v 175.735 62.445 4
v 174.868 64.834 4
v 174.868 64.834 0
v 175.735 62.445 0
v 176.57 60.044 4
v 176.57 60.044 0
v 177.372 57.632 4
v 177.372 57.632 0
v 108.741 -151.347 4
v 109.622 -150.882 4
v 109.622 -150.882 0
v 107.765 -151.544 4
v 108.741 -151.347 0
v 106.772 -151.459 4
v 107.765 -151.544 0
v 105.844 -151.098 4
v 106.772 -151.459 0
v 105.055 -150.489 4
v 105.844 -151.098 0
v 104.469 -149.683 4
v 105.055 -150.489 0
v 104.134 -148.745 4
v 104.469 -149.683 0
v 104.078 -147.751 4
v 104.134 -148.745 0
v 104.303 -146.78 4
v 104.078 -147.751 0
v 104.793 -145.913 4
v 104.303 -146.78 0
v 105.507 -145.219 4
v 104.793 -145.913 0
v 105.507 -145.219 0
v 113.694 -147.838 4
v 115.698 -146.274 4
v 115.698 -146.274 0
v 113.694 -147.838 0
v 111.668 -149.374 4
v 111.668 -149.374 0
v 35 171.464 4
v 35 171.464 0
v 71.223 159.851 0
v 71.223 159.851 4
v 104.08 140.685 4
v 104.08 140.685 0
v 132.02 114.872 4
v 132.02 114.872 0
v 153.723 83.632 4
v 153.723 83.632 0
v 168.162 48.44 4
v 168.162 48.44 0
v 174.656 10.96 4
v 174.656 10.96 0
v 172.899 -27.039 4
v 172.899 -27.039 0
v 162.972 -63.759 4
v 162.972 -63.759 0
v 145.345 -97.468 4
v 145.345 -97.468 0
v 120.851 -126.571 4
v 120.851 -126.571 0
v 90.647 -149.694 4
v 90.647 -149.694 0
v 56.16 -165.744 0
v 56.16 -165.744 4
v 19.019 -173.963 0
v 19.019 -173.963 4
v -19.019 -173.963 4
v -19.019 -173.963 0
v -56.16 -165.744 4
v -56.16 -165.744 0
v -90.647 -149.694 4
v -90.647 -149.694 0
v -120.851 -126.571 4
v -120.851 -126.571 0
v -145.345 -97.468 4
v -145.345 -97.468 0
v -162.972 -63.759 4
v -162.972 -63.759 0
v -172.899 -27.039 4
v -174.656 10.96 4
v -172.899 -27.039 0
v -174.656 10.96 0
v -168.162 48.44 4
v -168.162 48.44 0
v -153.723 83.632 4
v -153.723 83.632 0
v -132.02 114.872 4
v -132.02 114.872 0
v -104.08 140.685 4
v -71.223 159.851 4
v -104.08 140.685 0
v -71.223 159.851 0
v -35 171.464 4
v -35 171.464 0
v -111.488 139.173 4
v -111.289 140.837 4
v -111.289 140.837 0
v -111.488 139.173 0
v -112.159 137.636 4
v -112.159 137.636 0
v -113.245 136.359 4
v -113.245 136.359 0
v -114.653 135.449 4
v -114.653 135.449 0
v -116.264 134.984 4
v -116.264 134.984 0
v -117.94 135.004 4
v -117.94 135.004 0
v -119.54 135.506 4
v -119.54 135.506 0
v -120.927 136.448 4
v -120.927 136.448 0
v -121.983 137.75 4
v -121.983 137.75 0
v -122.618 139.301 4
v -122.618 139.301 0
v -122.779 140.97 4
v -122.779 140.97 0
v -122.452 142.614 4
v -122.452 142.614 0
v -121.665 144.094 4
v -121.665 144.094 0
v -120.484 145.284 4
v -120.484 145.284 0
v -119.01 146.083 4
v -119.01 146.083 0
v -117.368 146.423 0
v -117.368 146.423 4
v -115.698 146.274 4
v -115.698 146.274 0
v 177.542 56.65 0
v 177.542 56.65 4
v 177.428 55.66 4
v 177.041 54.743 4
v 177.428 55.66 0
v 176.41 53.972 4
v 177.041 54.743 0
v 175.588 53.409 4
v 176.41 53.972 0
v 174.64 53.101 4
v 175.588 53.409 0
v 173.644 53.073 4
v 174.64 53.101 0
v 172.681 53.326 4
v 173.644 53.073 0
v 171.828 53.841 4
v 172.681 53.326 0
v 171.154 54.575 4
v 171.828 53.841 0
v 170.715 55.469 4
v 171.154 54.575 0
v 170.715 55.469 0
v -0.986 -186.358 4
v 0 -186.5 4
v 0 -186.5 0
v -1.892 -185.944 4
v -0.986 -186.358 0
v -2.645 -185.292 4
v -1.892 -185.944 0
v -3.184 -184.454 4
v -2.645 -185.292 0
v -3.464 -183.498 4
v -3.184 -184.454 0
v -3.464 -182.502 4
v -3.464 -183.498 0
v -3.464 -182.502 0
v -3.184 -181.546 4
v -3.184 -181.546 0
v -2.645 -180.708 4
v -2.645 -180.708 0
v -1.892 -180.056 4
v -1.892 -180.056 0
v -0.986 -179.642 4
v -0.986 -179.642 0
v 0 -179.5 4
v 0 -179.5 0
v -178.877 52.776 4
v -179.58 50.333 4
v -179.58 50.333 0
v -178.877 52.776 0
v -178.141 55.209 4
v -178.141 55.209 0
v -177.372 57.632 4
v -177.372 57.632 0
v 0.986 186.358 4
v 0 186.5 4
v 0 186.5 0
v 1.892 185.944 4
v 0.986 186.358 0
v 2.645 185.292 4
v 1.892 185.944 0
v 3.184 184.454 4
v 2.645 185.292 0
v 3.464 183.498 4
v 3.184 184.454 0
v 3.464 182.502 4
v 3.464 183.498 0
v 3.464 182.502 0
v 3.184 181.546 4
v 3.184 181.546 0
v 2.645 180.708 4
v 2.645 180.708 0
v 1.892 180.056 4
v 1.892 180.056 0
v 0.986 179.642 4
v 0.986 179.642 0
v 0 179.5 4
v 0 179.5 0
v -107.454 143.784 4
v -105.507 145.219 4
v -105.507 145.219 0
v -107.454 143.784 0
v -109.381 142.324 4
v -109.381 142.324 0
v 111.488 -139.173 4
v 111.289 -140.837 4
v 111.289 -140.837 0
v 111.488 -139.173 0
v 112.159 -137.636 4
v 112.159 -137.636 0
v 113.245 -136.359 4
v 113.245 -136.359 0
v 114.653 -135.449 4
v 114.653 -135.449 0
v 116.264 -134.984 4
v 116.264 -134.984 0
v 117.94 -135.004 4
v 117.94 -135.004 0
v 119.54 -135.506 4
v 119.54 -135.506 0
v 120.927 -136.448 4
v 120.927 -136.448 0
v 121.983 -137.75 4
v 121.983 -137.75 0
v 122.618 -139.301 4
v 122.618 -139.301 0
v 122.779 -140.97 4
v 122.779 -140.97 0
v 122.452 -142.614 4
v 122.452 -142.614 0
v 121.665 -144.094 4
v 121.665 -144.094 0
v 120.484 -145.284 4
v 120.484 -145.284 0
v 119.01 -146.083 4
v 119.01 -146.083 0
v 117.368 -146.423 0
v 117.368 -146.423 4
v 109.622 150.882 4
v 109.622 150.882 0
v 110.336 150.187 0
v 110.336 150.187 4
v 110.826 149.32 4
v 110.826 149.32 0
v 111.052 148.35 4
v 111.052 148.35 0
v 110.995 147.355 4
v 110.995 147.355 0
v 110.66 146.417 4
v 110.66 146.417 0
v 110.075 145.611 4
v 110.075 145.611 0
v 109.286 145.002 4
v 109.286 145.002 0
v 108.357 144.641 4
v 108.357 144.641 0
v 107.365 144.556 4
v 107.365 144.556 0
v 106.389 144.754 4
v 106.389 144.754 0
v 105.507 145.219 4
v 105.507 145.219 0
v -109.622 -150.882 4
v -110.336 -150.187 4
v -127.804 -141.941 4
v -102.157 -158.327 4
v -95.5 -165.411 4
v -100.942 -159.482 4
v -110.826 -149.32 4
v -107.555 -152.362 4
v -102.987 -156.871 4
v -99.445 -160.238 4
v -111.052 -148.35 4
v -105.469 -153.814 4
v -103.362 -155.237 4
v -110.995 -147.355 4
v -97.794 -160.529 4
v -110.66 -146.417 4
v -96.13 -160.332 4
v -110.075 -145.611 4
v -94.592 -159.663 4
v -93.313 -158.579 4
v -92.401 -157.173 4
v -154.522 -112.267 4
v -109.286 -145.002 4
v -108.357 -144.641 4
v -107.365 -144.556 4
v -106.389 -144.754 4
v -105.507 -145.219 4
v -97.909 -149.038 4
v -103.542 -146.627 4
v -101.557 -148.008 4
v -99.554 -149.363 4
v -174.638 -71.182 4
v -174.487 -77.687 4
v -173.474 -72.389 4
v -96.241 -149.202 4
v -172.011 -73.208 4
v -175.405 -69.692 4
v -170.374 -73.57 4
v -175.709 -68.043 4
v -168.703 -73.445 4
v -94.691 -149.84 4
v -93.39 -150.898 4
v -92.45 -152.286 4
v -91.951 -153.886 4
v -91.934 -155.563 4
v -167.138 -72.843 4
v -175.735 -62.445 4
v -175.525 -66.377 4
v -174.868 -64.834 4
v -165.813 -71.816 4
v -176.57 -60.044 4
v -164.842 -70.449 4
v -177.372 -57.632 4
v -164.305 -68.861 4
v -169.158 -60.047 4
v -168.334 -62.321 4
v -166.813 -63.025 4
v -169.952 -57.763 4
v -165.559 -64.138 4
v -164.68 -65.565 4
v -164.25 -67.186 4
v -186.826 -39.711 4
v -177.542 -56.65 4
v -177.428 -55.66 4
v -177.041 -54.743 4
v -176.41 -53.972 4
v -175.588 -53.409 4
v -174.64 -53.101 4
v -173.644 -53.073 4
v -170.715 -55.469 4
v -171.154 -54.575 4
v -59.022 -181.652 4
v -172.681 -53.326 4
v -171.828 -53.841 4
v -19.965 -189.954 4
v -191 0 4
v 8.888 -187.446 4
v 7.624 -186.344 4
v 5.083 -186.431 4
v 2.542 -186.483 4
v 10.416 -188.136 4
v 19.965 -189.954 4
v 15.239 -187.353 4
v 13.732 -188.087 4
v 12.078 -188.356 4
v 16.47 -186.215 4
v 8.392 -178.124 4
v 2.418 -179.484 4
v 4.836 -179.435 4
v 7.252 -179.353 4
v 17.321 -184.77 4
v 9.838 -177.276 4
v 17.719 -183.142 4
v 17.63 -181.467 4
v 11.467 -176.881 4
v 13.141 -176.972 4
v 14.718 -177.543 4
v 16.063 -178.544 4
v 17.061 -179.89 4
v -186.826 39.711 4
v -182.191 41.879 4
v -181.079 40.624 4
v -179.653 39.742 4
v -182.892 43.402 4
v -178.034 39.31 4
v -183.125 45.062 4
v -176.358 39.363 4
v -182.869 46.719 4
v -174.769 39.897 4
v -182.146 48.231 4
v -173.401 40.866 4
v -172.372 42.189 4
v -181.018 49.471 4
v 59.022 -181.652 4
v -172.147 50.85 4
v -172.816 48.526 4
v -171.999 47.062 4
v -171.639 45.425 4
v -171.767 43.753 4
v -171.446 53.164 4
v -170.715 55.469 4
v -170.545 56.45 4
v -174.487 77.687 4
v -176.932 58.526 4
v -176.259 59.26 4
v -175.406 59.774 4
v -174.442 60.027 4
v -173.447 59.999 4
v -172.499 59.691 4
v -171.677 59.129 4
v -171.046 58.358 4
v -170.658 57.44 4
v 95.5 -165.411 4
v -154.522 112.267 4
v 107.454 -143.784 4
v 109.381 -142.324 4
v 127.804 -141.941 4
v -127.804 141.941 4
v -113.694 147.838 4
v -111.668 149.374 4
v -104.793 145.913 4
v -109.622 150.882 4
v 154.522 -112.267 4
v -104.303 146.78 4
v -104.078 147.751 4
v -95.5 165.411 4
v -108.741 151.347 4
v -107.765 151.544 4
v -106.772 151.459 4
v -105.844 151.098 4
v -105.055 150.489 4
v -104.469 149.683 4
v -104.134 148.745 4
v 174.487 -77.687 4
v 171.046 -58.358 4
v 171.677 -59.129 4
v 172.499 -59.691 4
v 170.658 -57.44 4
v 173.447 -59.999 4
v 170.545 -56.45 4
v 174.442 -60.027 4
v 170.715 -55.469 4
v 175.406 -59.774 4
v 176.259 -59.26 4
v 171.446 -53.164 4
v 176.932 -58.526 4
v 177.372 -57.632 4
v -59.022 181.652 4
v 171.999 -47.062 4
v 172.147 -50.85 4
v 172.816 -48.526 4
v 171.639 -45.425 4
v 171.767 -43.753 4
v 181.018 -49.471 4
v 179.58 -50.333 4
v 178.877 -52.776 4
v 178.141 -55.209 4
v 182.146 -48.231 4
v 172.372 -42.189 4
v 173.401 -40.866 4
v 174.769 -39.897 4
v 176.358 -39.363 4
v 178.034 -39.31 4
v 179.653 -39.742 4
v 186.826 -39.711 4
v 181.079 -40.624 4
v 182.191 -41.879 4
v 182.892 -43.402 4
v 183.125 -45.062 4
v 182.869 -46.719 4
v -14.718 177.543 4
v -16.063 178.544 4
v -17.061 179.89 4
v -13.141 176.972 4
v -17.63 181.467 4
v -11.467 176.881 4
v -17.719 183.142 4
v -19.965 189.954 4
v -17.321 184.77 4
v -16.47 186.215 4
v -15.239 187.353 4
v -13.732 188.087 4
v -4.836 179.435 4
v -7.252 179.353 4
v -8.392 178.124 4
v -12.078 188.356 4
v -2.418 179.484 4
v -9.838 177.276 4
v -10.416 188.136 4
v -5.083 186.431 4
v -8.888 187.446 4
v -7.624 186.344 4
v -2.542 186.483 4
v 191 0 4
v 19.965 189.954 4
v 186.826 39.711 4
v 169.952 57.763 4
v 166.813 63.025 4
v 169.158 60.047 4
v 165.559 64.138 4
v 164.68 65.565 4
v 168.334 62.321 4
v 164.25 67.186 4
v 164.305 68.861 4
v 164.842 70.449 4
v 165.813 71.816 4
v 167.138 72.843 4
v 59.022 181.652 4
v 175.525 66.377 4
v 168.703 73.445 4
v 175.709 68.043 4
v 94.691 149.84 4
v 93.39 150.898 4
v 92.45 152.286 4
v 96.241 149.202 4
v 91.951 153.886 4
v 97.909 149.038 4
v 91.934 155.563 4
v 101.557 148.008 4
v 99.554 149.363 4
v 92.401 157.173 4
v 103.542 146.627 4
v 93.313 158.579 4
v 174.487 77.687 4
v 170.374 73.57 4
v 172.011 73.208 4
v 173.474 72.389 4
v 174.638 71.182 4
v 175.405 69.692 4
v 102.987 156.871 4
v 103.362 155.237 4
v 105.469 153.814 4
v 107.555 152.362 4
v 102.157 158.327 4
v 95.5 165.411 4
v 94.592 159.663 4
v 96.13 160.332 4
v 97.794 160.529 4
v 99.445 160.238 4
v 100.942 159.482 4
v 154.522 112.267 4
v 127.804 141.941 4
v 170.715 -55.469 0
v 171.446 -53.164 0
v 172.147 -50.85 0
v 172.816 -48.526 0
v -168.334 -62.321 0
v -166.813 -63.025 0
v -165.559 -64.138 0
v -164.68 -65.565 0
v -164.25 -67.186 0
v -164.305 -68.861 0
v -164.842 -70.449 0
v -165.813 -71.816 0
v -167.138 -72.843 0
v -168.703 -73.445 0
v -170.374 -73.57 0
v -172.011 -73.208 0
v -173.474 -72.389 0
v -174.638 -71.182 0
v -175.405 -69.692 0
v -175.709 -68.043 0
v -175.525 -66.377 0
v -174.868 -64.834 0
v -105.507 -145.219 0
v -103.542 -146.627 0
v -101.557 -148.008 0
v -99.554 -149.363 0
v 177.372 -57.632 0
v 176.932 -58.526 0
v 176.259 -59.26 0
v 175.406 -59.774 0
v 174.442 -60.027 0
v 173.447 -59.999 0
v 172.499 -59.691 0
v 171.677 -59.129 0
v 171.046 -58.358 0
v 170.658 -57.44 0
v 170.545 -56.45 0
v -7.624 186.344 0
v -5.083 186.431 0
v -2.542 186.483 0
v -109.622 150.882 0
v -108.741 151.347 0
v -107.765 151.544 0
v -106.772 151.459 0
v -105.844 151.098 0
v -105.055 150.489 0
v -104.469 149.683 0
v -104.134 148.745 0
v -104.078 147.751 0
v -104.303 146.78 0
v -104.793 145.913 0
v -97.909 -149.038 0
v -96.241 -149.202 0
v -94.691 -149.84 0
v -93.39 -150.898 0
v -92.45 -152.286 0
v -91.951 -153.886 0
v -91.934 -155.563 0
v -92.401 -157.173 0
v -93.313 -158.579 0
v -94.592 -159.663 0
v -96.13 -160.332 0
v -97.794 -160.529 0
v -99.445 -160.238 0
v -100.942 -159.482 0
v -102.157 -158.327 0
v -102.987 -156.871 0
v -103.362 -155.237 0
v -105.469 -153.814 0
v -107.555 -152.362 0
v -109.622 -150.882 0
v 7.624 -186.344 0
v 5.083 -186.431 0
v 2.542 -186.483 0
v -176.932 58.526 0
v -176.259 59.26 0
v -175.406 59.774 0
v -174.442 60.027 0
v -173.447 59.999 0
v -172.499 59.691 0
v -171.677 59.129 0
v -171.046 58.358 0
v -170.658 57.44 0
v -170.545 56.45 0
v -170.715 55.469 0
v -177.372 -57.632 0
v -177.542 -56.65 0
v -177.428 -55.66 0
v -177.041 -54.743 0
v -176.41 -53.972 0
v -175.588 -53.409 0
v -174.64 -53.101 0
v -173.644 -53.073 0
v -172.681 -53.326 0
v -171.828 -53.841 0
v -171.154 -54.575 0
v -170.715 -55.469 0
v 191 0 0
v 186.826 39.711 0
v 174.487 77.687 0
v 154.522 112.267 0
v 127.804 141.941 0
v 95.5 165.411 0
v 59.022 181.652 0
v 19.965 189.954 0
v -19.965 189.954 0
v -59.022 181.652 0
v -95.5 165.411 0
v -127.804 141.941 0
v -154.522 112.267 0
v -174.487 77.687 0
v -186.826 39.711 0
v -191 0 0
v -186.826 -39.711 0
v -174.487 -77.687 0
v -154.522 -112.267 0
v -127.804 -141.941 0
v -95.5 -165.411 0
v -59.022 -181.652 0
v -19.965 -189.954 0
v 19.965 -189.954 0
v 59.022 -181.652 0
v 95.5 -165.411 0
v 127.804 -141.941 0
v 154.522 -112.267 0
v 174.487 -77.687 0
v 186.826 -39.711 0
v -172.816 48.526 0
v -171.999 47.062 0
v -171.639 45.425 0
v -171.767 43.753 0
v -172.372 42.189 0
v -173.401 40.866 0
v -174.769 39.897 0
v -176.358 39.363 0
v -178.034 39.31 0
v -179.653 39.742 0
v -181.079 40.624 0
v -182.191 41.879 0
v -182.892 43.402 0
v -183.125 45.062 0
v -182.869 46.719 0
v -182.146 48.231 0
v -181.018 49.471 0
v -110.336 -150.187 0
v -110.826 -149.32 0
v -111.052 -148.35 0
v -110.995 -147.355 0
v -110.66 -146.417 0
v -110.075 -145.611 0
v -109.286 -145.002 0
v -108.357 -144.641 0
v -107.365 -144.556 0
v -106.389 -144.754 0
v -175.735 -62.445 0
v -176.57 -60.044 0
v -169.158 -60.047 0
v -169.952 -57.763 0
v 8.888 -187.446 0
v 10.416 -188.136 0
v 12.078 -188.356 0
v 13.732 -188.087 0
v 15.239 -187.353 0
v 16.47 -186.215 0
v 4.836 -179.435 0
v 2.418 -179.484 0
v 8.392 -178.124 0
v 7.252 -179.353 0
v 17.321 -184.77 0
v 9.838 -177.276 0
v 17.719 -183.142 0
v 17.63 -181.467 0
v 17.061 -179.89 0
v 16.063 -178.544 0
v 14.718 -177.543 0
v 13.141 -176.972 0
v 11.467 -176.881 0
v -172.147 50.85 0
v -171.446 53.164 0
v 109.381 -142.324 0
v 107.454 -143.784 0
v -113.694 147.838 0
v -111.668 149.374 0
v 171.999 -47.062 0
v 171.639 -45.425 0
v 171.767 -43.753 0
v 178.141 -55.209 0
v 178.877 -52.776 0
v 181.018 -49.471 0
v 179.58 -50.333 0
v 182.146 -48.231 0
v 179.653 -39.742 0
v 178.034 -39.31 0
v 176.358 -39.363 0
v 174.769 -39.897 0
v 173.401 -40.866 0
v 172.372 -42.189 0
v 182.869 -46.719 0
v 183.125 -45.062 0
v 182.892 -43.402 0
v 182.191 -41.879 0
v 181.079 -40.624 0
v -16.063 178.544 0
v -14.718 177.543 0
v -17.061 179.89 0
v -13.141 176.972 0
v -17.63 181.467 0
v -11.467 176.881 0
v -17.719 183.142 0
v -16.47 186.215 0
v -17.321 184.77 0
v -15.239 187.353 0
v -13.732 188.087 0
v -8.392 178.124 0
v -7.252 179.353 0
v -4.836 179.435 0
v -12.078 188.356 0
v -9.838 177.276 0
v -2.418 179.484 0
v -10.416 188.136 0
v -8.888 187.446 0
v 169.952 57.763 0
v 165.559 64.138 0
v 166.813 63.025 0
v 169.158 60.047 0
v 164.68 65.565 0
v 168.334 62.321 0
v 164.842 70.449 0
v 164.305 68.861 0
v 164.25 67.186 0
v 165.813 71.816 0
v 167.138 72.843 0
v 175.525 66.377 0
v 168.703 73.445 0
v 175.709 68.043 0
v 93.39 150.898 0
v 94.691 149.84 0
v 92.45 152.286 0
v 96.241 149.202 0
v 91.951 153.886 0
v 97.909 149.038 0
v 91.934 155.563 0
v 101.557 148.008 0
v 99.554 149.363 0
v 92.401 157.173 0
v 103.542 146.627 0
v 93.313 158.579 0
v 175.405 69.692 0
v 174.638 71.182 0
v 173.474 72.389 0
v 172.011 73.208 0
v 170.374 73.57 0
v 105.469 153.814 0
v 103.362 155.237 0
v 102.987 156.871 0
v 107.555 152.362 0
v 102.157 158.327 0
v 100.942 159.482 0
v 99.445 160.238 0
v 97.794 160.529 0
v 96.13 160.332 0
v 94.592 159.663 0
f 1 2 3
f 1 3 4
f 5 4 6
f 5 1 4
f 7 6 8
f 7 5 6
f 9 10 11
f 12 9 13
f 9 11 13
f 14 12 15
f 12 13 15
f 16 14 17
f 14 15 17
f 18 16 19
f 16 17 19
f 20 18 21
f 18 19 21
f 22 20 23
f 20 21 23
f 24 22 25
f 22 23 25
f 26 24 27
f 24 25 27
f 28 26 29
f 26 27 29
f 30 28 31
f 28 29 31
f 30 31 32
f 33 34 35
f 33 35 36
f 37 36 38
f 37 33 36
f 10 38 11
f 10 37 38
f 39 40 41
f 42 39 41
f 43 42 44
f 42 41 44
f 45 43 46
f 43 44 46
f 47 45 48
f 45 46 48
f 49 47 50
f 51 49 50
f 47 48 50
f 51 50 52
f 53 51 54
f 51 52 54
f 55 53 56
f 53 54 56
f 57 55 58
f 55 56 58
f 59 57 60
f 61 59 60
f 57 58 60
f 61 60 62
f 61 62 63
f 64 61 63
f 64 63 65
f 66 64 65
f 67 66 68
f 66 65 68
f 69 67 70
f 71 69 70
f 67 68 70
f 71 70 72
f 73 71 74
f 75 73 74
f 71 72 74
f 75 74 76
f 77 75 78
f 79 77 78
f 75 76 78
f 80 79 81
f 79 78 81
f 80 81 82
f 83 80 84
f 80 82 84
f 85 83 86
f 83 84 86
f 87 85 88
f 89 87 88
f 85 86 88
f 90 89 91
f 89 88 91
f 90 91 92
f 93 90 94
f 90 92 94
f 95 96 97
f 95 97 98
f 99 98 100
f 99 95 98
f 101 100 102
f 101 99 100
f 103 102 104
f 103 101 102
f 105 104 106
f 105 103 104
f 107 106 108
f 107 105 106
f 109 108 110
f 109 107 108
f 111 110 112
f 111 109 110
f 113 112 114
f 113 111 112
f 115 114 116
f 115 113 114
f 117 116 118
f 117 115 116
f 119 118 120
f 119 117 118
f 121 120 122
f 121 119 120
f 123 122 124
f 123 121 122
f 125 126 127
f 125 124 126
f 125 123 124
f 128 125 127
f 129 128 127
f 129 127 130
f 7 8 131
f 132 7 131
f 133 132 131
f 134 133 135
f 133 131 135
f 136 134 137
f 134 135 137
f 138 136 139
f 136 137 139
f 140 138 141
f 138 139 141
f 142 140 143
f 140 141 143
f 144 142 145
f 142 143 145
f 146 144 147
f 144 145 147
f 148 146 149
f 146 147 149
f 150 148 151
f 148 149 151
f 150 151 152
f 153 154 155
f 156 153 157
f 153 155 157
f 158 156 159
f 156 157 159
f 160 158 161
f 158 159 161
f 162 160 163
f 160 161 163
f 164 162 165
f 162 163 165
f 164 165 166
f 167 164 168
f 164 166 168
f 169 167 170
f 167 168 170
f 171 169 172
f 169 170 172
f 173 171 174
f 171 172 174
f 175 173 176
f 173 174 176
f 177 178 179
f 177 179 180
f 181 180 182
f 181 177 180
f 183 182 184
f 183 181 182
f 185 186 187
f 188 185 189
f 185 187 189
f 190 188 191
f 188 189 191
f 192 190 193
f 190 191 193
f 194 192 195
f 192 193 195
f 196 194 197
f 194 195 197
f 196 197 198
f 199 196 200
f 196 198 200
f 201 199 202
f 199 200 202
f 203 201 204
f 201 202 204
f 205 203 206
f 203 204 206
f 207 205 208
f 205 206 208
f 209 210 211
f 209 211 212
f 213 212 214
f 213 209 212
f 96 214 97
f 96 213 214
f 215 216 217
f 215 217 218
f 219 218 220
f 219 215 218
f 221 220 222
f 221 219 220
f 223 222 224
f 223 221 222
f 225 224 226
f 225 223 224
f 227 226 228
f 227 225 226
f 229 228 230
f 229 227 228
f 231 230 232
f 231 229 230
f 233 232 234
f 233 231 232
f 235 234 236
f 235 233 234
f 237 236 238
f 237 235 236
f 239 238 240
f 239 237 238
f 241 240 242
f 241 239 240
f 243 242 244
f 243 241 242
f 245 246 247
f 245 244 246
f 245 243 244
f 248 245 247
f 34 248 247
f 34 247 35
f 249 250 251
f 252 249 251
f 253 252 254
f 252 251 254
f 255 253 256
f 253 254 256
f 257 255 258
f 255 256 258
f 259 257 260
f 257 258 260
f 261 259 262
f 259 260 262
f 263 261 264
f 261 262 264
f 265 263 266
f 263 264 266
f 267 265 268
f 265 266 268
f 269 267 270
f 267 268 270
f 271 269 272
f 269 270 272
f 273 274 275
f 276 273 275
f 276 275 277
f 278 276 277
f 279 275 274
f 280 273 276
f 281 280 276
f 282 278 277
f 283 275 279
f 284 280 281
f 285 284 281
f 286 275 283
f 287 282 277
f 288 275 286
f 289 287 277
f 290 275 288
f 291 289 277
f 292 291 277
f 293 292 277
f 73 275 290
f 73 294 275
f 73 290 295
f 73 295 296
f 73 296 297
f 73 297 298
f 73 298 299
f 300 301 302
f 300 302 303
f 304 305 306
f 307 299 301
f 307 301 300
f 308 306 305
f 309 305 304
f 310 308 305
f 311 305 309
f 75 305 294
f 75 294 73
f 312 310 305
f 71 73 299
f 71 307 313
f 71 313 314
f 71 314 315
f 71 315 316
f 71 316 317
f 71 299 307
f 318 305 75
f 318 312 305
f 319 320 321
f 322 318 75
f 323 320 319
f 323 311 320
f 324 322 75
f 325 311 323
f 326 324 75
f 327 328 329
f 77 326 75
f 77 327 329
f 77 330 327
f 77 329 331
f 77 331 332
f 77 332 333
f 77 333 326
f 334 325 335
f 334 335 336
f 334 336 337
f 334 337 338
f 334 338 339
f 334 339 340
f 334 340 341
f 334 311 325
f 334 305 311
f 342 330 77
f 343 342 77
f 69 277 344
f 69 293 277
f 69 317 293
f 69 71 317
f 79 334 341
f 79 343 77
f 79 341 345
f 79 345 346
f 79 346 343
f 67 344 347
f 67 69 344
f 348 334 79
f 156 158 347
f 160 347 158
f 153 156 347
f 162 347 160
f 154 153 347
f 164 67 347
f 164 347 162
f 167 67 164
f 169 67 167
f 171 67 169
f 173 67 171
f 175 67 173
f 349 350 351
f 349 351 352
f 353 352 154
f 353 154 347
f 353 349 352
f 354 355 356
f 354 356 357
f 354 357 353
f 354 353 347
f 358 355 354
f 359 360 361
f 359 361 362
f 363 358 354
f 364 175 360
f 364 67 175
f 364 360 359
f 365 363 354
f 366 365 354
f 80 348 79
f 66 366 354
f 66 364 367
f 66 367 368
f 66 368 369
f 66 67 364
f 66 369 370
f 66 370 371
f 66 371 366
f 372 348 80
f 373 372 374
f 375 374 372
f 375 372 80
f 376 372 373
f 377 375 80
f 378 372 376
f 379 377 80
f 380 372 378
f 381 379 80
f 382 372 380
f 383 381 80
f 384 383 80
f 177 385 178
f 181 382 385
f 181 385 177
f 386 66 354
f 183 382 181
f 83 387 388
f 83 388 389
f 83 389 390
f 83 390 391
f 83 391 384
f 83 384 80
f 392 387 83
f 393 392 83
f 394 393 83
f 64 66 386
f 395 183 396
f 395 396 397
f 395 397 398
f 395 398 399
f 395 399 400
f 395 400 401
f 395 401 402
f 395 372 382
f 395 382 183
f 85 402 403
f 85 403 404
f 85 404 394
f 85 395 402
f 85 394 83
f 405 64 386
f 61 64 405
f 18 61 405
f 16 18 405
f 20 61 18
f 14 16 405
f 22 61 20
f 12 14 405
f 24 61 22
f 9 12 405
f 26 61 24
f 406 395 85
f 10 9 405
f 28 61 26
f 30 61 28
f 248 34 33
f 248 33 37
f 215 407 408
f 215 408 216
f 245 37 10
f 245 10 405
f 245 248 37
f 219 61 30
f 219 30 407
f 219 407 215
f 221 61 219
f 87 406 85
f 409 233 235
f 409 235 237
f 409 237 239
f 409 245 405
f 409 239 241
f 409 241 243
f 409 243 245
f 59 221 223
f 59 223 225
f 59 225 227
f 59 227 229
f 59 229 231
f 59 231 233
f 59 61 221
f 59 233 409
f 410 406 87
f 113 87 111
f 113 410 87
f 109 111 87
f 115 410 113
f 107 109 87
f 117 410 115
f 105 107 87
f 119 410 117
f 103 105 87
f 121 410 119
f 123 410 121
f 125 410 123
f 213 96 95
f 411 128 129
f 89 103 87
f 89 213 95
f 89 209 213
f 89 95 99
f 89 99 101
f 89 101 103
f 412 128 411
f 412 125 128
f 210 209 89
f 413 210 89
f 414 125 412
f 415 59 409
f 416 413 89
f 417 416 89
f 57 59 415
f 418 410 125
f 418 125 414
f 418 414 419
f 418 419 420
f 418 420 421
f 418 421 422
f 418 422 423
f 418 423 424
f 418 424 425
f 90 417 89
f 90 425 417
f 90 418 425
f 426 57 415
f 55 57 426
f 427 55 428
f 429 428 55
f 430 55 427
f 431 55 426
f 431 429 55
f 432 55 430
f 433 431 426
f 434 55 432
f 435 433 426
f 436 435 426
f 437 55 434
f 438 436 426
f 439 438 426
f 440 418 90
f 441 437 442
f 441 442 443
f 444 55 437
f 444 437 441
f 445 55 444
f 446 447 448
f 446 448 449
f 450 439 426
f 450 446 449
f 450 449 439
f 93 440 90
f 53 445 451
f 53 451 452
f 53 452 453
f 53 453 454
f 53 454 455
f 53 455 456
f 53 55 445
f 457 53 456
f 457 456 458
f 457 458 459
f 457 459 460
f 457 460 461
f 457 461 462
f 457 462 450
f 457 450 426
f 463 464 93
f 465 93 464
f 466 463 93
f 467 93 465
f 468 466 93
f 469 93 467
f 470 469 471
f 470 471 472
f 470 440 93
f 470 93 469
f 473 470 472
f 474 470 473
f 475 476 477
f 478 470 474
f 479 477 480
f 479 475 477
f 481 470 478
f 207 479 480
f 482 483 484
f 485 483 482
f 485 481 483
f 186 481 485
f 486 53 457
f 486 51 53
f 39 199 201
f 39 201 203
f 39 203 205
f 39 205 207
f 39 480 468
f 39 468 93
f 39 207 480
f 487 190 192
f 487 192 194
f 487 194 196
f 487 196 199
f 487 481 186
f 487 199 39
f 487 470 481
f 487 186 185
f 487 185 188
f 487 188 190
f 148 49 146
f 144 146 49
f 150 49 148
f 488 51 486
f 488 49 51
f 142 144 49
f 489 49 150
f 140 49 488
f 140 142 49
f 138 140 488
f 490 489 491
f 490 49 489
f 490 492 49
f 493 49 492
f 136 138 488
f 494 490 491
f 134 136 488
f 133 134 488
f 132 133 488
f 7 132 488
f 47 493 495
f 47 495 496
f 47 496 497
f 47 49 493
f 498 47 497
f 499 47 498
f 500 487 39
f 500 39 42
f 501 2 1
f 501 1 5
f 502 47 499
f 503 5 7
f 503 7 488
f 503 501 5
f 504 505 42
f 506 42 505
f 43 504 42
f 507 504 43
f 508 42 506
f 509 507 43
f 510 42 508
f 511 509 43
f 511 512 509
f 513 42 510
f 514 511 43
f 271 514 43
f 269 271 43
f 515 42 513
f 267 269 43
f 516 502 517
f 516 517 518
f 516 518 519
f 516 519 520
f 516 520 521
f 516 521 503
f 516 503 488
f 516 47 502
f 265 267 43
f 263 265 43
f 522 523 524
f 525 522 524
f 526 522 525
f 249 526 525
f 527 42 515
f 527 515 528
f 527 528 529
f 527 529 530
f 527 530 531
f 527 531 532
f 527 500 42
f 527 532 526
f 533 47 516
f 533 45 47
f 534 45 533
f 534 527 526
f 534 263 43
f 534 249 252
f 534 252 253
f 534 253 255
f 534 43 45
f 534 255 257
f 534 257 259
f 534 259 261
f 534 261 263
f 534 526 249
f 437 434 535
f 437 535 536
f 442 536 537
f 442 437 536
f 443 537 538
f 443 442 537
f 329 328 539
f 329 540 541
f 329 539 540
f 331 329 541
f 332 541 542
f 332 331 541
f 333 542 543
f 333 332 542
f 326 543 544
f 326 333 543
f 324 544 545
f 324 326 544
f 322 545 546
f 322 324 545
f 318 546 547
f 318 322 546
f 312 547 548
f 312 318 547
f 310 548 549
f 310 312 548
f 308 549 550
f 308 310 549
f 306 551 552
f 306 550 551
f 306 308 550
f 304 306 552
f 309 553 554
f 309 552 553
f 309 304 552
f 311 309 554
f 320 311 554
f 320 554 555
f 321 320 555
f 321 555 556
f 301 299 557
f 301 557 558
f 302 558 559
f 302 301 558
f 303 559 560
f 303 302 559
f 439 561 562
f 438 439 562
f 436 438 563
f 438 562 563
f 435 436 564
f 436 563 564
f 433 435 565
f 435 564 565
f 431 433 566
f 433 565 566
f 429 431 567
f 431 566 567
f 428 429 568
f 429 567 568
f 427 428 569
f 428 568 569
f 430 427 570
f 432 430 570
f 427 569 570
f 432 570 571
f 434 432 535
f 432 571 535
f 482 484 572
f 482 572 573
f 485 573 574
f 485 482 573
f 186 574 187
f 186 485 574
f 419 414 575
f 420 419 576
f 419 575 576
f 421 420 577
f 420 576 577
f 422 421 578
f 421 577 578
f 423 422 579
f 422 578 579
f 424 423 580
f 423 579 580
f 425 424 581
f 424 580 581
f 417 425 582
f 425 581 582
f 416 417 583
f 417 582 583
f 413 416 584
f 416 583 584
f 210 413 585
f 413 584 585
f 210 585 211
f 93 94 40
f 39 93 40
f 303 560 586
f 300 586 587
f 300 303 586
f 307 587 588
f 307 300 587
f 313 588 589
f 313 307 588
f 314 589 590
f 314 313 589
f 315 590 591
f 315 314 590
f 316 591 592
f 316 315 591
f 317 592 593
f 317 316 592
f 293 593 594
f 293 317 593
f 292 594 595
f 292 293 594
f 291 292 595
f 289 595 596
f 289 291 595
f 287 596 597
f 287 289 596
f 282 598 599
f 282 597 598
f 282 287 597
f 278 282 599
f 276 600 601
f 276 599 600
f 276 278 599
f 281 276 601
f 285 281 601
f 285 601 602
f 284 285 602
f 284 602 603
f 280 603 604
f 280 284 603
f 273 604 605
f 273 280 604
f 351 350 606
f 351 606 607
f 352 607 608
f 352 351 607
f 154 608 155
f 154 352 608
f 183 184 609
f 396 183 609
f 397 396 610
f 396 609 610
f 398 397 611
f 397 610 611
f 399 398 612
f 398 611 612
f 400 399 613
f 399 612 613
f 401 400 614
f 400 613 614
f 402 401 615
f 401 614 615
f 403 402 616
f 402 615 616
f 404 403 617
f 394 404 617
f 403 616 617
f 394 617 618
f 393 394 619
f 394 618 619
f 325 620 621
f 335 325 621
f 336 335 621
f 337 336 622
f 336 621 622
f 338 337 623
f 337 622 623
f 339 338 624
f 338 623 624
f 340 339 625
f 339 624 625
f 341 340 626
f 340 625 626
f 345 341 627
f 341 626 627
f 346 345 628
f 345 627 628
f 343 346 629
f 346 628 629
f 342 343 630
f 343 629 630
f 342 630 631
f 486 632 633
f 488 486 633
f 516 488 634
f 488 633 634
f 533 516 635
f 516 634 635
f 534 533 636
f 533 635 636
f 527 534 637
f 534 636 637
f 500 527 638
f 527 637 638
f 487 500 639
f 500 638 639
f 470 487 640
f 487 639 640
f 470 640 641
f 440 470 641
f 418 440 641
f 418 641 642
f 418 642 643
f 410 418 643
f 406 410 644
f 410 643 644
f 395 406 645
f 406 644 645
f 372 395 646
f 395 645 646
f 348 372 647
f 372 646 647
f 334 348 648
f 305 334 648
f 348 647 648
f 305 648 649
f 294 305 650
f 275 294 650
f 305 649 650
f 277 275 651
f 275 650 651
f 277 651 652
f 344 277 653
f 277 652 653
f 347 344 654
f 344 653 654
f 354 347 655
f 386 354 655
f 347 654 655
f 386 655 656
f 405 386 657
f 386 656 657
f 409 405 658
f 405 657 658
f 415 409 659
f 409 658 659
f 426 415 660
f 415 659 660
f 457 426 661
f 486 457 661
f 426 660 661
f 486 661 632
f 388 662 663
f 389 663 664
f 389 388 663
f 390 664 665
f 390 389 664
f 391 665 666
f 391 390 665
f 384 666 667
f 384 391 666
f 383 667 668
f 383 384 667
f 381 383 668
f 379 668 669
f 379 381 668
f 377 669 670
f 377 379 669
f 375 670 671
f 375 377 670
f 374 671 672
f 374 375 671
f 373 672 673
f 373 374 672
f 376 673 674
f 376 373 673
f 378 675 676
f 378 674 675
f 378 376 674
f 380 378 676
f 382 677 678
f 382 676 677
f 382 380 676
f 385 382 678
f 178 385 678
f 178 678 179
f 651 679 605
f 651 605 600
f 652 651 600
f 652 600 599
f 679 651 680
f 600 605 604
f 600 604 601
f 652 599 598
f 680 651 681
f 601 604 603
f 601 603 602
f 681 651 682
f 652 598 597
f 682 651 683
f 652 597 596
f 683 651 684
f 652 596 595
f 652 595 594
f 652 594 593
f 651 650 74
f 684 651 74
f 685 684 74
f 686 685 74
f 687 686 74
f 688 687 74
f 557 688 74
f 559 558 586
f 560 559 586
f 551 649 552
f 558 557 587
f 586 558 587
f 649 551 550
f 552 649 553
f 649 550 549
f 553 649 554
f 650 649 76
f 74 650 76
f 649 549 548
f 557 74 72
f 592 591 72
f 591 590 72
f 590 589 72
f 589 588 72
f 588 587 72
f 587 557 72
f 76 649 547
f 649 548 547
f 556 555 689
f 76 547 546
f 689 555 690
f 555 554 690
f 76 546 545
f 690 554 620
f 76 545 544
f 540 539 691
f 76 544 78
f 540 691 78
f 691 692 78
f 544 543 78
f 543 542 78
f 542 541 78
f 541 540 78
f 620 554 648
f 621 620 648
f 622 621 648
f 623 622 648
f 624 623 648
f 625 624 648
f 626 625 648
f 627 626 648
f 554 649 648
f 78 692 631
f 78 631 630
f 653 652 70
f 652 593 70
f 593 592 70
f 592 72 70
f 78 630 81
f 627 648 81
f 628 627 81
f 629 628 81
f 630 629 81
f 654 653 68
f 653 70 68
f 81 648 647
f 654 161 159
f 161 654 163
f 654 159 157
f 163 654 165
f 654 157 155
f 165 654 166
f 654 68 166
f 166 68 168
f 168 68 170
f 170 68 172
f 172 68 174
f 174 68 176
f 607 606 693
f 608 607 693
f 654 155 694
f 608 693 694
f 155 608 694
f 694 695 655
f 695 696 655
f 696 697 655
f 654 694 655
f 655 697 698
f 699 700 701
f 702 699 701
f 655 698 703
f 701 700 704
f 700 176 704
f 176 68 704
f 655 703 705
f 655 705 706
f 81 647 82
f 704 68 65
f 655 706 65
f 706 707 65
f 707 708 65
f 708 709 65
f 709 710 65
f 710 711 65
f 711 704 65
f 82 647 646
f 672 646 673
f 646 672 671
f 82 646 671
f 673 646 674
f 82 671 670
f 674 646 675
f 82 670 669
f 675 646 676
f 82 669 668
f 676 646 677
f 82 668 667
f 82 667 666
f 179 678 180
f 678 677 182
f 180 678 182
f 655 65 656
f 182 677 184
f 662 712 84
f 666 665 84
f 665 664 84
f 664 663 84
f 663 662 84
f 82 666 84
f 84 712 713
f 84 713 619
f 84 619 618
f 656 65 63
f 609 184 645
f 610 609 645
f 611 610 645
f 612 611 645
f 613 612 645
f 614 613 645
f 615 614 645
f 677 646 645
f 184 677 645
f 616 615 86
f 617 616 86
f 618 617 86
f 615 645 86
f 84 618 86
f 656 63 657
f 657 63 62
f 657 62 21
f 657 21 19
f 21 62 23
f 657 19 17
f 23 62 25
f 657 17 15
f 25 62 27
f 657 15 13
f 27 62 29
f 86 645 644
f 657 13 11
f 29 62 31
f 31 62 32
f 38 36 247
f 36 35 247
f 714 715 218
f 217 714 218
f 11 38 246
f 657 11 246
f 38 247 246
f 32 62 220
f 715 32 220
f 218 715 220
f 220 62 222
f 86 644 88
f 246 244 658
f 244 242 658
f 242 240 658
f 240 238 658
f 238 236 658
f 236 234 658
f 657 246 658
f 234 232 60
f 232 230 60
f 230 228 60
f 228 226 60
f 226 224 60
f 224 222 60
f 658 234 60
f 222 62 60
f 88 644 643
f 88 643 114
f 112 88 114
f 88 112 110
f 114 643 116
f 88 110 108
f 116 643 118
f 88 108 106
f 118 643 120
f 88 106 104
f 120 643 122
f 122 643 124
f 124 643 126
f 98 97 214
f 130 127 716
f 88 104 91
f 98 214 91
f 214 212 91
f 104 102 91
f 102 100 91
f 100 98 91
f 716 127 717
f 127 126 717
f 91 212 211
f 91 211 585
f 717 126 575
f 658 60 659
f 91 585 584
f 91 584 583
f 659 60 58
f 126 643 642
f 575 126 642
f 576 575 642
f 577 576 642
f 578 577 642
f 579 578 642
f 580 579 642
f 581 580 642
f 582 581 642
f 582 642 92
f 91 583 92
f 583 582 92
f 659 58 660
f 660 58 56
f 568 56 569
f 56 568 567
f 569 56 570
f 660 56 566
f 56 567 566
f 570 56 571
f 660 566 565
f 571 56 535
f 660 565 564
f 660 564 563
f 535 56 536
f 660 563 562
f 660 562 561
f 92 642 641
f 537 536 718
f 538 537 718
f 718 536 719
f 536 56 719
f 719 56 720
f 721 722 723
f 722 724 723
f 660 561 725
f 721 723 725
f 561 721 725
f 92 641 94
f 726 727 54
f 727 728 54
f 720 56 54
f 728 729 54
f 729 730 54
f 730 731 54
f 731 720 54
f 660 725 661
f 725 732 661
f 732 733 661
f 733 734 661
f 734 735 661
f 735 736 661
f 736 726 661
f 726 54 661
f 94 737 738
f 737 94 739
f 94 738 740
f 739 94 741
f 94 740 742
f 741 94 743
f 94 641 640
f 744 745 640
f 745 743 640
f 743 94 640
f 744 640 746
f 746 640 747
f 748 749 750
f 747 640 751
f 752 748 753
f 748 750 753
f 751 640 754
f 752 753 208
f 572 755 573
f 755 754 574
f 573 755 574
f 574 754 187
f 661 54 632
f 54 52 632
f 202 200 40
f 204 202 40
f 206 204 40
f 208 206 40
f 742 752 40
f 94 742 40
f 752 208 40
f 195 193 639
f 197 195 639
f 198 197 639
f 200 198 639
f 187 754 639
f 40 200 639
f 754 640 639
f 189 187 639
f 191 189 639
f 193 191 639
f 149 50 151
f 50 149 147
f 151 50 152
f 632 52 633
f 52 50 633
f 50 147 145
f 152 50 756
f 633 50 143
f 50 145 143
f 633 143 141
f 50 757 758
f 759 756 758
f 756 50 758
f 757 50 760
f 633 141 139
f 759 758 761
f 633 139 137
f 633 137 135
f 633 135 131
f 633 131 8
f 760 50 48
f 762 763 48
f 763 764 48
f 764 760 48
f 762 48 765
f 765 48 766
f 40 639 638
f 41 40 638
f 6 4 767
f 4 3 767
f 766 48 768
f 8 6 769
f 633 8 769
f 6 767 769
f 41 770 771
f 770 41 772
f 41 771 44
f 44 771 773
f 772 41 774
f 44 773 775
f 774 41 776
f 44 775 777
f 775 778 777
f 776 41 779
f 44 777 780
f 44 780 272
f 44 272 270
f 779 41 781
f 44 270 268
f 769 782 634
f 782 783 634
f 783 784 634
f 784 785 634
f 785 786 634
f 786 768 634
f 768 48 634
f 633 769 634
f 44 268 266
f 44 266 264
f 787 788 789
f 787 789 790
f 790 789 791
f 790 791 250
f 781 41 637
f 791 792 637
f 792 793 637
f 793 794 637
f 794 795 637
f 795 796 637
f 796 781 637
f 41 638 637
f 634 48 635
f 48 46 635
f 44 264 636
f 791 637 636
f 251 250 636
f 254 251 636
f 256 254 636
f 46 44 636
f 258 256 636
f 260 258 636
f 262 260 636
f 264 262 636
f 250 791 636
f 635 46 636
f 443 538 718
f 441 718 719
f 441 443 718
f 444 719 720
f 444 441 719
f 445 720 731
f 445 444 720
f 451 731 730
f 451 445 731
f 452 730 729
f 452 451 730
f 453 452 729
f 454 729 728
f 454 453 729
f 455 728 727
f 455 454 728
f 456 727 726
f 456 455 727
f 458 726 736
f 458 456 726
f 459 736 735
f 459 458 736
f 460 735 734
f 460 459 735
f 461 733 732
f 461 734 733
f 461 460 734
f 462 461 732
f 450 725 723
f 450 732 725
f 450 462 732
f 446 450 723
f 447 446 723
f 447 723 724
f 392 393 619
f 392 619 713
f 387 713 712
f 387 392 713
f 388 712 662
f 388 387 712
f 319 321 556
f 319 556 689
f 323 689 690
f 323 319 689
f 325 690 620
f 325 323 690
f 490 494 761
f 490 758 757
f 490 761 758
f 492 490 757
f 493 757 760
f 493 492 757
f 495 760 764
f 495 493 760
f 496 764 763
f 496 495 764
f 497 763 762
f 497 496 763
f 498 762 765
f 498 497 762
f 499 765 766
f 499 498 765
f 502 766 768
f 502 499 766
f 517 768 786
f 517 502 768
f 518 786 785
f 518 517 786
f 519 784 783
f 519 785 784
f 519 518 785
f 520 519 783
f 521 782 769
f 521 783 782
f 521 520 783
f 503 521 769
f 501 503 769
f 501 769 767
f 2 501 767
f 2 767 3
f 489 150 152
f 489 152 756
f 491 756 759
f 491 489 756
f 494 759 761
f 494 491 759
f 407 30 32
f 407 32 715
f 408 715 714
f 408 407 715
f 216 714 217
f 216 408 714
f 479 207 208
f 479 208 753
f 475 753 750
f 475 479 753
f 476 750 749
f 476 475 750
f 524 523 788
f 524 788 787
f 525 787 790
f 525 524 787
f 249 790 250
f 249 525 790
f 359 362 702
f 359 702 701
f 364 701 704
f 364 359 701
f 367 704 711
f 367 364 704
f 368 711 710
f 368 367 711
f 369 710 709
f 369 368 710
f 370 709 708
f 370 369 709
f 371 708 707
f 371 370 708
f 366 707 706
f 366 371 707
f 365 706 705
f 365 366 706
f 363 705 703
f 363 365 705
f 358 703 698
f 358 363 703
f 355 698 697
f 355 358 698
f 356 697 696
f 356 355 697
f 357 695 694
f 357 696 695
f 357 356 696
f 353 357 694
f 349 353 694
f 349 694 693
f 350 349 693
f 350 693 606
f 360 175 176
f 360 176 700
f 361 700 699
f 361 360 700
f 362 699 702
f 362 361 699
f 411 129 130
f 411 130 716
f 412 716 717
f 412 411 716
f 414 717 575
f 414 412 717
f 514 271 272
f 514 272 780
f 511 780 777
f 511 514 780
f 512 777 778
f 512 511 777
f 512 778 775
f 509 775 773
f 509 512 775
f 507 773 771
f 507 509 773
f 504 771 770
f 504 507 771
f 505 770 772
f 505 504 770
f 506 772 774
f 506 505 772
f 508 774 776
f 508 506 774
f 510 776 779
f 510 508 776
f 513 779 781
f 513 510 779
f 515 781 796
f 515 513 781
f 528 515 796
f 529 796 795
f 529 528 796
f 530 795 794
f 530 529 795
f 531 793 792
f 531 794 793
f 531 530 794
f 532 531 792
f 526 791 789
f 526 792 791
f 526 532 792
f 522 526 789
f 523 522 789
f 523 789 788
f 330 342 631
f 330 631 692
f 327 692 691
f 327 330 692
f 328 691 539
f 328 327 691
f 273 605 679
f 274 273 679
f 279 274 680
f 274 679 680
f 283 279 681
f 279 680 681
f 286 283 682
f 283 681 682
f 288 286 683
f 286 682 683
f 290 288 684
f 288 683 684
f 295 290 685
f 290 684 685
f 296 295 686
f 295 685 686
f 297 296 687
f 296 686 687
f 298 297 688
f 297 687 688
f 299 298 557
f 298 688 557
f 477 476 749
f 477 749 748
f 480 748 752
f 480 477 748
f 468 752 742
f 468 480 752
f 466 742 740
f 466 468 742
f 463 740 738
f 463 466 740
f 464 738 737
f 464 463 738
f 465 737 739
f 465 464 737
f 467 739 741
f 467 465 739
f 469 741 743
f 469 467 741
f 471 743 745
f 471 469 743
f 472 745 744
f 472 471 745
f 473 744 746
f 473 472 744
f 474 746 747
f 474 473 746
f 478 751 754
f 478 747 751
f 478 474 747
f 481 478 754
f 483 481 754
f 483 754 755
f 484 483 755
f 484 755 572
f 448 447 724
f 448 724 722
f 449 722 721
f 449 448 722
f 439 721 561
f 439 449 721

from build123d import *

# Parameters (mm, degrees)
SKETCH1_R            = 191
BOSS_EXTRUDE1_DEPTH  = 4
M6_CLEARANCE_HOLE1_D = 7
CUT_EXTRUDE3_DEPTH   = 5
CIRPATTERN1_COUNT    = 10


with BuildPart() as part:
    # Sketch1 → Boss-Extrude1 (new body)
    with BuildSketch(Plane.XY):
        Circle(SKETCH1_R)
        with BuildLine():
            Line((-35, 171.464281995), (35, 171.464281995))
            ThreePointArc((35, 171.464281995), (0, -175), (-35, 171.464281995))
        make_face(mode=Mode.SUBTRACT)
    extrude(amount=BOSS_EXTRUDE1_DEPTH)

    # M6 Clearance Hole1 (through all)
    with Locations(Plane.XY.offset(4)):
        with Locations((0, 183)):
            m6_clearance_hole1 = Hole(M6_CLEARANCE_HOLE1_D / 2)

    # Sketch4 → Cut-Extrude3 (cut, through all)
    with BuildSketch(Plane.XY.offset(4)):
        with BuildLine():
            Line((0, 186.5), (0, 179.5))
            ThreePointArc((0, 179.5), (-3.626876902, 179.463354933), (-7.252272944, 179.353434696))
            ThreePointArc((-7.252272944, 179.353434696), (-17.735437822, 182.301261264), (-7.623966656, 186.344104099))
            ThreePointArc((-7.623966656, 186.344104099), (-3.81278019, 186.461021952), (0, 186.5))
        make_face()
    cut_extrude3 = extrude(amount=-CUT_EXTRUDE3_DEPTH, mode=Mode.SUBTRACT)

    # CirPattern1: M6 Clearance Hole1, Cut-Extrude3 ×10 about axis
    cirpattern1_axis = Axis((0, 0, 0), (0, 0, 1))
    for i in range(1, CIRPATTERN1_COUNT):
        add(m6_clearance_hole1.rotate(cirpattern1_axis, i * 360 / CIRPATTERN1_COUNT), mode=Mode.SUBTRACT)
        add(cut_extrude3.rotate(cirpattern1_axis, i * 360 / CIRPATTERN1_COUNT), mode=Mode.SUBTRACT)


solid = part.part
